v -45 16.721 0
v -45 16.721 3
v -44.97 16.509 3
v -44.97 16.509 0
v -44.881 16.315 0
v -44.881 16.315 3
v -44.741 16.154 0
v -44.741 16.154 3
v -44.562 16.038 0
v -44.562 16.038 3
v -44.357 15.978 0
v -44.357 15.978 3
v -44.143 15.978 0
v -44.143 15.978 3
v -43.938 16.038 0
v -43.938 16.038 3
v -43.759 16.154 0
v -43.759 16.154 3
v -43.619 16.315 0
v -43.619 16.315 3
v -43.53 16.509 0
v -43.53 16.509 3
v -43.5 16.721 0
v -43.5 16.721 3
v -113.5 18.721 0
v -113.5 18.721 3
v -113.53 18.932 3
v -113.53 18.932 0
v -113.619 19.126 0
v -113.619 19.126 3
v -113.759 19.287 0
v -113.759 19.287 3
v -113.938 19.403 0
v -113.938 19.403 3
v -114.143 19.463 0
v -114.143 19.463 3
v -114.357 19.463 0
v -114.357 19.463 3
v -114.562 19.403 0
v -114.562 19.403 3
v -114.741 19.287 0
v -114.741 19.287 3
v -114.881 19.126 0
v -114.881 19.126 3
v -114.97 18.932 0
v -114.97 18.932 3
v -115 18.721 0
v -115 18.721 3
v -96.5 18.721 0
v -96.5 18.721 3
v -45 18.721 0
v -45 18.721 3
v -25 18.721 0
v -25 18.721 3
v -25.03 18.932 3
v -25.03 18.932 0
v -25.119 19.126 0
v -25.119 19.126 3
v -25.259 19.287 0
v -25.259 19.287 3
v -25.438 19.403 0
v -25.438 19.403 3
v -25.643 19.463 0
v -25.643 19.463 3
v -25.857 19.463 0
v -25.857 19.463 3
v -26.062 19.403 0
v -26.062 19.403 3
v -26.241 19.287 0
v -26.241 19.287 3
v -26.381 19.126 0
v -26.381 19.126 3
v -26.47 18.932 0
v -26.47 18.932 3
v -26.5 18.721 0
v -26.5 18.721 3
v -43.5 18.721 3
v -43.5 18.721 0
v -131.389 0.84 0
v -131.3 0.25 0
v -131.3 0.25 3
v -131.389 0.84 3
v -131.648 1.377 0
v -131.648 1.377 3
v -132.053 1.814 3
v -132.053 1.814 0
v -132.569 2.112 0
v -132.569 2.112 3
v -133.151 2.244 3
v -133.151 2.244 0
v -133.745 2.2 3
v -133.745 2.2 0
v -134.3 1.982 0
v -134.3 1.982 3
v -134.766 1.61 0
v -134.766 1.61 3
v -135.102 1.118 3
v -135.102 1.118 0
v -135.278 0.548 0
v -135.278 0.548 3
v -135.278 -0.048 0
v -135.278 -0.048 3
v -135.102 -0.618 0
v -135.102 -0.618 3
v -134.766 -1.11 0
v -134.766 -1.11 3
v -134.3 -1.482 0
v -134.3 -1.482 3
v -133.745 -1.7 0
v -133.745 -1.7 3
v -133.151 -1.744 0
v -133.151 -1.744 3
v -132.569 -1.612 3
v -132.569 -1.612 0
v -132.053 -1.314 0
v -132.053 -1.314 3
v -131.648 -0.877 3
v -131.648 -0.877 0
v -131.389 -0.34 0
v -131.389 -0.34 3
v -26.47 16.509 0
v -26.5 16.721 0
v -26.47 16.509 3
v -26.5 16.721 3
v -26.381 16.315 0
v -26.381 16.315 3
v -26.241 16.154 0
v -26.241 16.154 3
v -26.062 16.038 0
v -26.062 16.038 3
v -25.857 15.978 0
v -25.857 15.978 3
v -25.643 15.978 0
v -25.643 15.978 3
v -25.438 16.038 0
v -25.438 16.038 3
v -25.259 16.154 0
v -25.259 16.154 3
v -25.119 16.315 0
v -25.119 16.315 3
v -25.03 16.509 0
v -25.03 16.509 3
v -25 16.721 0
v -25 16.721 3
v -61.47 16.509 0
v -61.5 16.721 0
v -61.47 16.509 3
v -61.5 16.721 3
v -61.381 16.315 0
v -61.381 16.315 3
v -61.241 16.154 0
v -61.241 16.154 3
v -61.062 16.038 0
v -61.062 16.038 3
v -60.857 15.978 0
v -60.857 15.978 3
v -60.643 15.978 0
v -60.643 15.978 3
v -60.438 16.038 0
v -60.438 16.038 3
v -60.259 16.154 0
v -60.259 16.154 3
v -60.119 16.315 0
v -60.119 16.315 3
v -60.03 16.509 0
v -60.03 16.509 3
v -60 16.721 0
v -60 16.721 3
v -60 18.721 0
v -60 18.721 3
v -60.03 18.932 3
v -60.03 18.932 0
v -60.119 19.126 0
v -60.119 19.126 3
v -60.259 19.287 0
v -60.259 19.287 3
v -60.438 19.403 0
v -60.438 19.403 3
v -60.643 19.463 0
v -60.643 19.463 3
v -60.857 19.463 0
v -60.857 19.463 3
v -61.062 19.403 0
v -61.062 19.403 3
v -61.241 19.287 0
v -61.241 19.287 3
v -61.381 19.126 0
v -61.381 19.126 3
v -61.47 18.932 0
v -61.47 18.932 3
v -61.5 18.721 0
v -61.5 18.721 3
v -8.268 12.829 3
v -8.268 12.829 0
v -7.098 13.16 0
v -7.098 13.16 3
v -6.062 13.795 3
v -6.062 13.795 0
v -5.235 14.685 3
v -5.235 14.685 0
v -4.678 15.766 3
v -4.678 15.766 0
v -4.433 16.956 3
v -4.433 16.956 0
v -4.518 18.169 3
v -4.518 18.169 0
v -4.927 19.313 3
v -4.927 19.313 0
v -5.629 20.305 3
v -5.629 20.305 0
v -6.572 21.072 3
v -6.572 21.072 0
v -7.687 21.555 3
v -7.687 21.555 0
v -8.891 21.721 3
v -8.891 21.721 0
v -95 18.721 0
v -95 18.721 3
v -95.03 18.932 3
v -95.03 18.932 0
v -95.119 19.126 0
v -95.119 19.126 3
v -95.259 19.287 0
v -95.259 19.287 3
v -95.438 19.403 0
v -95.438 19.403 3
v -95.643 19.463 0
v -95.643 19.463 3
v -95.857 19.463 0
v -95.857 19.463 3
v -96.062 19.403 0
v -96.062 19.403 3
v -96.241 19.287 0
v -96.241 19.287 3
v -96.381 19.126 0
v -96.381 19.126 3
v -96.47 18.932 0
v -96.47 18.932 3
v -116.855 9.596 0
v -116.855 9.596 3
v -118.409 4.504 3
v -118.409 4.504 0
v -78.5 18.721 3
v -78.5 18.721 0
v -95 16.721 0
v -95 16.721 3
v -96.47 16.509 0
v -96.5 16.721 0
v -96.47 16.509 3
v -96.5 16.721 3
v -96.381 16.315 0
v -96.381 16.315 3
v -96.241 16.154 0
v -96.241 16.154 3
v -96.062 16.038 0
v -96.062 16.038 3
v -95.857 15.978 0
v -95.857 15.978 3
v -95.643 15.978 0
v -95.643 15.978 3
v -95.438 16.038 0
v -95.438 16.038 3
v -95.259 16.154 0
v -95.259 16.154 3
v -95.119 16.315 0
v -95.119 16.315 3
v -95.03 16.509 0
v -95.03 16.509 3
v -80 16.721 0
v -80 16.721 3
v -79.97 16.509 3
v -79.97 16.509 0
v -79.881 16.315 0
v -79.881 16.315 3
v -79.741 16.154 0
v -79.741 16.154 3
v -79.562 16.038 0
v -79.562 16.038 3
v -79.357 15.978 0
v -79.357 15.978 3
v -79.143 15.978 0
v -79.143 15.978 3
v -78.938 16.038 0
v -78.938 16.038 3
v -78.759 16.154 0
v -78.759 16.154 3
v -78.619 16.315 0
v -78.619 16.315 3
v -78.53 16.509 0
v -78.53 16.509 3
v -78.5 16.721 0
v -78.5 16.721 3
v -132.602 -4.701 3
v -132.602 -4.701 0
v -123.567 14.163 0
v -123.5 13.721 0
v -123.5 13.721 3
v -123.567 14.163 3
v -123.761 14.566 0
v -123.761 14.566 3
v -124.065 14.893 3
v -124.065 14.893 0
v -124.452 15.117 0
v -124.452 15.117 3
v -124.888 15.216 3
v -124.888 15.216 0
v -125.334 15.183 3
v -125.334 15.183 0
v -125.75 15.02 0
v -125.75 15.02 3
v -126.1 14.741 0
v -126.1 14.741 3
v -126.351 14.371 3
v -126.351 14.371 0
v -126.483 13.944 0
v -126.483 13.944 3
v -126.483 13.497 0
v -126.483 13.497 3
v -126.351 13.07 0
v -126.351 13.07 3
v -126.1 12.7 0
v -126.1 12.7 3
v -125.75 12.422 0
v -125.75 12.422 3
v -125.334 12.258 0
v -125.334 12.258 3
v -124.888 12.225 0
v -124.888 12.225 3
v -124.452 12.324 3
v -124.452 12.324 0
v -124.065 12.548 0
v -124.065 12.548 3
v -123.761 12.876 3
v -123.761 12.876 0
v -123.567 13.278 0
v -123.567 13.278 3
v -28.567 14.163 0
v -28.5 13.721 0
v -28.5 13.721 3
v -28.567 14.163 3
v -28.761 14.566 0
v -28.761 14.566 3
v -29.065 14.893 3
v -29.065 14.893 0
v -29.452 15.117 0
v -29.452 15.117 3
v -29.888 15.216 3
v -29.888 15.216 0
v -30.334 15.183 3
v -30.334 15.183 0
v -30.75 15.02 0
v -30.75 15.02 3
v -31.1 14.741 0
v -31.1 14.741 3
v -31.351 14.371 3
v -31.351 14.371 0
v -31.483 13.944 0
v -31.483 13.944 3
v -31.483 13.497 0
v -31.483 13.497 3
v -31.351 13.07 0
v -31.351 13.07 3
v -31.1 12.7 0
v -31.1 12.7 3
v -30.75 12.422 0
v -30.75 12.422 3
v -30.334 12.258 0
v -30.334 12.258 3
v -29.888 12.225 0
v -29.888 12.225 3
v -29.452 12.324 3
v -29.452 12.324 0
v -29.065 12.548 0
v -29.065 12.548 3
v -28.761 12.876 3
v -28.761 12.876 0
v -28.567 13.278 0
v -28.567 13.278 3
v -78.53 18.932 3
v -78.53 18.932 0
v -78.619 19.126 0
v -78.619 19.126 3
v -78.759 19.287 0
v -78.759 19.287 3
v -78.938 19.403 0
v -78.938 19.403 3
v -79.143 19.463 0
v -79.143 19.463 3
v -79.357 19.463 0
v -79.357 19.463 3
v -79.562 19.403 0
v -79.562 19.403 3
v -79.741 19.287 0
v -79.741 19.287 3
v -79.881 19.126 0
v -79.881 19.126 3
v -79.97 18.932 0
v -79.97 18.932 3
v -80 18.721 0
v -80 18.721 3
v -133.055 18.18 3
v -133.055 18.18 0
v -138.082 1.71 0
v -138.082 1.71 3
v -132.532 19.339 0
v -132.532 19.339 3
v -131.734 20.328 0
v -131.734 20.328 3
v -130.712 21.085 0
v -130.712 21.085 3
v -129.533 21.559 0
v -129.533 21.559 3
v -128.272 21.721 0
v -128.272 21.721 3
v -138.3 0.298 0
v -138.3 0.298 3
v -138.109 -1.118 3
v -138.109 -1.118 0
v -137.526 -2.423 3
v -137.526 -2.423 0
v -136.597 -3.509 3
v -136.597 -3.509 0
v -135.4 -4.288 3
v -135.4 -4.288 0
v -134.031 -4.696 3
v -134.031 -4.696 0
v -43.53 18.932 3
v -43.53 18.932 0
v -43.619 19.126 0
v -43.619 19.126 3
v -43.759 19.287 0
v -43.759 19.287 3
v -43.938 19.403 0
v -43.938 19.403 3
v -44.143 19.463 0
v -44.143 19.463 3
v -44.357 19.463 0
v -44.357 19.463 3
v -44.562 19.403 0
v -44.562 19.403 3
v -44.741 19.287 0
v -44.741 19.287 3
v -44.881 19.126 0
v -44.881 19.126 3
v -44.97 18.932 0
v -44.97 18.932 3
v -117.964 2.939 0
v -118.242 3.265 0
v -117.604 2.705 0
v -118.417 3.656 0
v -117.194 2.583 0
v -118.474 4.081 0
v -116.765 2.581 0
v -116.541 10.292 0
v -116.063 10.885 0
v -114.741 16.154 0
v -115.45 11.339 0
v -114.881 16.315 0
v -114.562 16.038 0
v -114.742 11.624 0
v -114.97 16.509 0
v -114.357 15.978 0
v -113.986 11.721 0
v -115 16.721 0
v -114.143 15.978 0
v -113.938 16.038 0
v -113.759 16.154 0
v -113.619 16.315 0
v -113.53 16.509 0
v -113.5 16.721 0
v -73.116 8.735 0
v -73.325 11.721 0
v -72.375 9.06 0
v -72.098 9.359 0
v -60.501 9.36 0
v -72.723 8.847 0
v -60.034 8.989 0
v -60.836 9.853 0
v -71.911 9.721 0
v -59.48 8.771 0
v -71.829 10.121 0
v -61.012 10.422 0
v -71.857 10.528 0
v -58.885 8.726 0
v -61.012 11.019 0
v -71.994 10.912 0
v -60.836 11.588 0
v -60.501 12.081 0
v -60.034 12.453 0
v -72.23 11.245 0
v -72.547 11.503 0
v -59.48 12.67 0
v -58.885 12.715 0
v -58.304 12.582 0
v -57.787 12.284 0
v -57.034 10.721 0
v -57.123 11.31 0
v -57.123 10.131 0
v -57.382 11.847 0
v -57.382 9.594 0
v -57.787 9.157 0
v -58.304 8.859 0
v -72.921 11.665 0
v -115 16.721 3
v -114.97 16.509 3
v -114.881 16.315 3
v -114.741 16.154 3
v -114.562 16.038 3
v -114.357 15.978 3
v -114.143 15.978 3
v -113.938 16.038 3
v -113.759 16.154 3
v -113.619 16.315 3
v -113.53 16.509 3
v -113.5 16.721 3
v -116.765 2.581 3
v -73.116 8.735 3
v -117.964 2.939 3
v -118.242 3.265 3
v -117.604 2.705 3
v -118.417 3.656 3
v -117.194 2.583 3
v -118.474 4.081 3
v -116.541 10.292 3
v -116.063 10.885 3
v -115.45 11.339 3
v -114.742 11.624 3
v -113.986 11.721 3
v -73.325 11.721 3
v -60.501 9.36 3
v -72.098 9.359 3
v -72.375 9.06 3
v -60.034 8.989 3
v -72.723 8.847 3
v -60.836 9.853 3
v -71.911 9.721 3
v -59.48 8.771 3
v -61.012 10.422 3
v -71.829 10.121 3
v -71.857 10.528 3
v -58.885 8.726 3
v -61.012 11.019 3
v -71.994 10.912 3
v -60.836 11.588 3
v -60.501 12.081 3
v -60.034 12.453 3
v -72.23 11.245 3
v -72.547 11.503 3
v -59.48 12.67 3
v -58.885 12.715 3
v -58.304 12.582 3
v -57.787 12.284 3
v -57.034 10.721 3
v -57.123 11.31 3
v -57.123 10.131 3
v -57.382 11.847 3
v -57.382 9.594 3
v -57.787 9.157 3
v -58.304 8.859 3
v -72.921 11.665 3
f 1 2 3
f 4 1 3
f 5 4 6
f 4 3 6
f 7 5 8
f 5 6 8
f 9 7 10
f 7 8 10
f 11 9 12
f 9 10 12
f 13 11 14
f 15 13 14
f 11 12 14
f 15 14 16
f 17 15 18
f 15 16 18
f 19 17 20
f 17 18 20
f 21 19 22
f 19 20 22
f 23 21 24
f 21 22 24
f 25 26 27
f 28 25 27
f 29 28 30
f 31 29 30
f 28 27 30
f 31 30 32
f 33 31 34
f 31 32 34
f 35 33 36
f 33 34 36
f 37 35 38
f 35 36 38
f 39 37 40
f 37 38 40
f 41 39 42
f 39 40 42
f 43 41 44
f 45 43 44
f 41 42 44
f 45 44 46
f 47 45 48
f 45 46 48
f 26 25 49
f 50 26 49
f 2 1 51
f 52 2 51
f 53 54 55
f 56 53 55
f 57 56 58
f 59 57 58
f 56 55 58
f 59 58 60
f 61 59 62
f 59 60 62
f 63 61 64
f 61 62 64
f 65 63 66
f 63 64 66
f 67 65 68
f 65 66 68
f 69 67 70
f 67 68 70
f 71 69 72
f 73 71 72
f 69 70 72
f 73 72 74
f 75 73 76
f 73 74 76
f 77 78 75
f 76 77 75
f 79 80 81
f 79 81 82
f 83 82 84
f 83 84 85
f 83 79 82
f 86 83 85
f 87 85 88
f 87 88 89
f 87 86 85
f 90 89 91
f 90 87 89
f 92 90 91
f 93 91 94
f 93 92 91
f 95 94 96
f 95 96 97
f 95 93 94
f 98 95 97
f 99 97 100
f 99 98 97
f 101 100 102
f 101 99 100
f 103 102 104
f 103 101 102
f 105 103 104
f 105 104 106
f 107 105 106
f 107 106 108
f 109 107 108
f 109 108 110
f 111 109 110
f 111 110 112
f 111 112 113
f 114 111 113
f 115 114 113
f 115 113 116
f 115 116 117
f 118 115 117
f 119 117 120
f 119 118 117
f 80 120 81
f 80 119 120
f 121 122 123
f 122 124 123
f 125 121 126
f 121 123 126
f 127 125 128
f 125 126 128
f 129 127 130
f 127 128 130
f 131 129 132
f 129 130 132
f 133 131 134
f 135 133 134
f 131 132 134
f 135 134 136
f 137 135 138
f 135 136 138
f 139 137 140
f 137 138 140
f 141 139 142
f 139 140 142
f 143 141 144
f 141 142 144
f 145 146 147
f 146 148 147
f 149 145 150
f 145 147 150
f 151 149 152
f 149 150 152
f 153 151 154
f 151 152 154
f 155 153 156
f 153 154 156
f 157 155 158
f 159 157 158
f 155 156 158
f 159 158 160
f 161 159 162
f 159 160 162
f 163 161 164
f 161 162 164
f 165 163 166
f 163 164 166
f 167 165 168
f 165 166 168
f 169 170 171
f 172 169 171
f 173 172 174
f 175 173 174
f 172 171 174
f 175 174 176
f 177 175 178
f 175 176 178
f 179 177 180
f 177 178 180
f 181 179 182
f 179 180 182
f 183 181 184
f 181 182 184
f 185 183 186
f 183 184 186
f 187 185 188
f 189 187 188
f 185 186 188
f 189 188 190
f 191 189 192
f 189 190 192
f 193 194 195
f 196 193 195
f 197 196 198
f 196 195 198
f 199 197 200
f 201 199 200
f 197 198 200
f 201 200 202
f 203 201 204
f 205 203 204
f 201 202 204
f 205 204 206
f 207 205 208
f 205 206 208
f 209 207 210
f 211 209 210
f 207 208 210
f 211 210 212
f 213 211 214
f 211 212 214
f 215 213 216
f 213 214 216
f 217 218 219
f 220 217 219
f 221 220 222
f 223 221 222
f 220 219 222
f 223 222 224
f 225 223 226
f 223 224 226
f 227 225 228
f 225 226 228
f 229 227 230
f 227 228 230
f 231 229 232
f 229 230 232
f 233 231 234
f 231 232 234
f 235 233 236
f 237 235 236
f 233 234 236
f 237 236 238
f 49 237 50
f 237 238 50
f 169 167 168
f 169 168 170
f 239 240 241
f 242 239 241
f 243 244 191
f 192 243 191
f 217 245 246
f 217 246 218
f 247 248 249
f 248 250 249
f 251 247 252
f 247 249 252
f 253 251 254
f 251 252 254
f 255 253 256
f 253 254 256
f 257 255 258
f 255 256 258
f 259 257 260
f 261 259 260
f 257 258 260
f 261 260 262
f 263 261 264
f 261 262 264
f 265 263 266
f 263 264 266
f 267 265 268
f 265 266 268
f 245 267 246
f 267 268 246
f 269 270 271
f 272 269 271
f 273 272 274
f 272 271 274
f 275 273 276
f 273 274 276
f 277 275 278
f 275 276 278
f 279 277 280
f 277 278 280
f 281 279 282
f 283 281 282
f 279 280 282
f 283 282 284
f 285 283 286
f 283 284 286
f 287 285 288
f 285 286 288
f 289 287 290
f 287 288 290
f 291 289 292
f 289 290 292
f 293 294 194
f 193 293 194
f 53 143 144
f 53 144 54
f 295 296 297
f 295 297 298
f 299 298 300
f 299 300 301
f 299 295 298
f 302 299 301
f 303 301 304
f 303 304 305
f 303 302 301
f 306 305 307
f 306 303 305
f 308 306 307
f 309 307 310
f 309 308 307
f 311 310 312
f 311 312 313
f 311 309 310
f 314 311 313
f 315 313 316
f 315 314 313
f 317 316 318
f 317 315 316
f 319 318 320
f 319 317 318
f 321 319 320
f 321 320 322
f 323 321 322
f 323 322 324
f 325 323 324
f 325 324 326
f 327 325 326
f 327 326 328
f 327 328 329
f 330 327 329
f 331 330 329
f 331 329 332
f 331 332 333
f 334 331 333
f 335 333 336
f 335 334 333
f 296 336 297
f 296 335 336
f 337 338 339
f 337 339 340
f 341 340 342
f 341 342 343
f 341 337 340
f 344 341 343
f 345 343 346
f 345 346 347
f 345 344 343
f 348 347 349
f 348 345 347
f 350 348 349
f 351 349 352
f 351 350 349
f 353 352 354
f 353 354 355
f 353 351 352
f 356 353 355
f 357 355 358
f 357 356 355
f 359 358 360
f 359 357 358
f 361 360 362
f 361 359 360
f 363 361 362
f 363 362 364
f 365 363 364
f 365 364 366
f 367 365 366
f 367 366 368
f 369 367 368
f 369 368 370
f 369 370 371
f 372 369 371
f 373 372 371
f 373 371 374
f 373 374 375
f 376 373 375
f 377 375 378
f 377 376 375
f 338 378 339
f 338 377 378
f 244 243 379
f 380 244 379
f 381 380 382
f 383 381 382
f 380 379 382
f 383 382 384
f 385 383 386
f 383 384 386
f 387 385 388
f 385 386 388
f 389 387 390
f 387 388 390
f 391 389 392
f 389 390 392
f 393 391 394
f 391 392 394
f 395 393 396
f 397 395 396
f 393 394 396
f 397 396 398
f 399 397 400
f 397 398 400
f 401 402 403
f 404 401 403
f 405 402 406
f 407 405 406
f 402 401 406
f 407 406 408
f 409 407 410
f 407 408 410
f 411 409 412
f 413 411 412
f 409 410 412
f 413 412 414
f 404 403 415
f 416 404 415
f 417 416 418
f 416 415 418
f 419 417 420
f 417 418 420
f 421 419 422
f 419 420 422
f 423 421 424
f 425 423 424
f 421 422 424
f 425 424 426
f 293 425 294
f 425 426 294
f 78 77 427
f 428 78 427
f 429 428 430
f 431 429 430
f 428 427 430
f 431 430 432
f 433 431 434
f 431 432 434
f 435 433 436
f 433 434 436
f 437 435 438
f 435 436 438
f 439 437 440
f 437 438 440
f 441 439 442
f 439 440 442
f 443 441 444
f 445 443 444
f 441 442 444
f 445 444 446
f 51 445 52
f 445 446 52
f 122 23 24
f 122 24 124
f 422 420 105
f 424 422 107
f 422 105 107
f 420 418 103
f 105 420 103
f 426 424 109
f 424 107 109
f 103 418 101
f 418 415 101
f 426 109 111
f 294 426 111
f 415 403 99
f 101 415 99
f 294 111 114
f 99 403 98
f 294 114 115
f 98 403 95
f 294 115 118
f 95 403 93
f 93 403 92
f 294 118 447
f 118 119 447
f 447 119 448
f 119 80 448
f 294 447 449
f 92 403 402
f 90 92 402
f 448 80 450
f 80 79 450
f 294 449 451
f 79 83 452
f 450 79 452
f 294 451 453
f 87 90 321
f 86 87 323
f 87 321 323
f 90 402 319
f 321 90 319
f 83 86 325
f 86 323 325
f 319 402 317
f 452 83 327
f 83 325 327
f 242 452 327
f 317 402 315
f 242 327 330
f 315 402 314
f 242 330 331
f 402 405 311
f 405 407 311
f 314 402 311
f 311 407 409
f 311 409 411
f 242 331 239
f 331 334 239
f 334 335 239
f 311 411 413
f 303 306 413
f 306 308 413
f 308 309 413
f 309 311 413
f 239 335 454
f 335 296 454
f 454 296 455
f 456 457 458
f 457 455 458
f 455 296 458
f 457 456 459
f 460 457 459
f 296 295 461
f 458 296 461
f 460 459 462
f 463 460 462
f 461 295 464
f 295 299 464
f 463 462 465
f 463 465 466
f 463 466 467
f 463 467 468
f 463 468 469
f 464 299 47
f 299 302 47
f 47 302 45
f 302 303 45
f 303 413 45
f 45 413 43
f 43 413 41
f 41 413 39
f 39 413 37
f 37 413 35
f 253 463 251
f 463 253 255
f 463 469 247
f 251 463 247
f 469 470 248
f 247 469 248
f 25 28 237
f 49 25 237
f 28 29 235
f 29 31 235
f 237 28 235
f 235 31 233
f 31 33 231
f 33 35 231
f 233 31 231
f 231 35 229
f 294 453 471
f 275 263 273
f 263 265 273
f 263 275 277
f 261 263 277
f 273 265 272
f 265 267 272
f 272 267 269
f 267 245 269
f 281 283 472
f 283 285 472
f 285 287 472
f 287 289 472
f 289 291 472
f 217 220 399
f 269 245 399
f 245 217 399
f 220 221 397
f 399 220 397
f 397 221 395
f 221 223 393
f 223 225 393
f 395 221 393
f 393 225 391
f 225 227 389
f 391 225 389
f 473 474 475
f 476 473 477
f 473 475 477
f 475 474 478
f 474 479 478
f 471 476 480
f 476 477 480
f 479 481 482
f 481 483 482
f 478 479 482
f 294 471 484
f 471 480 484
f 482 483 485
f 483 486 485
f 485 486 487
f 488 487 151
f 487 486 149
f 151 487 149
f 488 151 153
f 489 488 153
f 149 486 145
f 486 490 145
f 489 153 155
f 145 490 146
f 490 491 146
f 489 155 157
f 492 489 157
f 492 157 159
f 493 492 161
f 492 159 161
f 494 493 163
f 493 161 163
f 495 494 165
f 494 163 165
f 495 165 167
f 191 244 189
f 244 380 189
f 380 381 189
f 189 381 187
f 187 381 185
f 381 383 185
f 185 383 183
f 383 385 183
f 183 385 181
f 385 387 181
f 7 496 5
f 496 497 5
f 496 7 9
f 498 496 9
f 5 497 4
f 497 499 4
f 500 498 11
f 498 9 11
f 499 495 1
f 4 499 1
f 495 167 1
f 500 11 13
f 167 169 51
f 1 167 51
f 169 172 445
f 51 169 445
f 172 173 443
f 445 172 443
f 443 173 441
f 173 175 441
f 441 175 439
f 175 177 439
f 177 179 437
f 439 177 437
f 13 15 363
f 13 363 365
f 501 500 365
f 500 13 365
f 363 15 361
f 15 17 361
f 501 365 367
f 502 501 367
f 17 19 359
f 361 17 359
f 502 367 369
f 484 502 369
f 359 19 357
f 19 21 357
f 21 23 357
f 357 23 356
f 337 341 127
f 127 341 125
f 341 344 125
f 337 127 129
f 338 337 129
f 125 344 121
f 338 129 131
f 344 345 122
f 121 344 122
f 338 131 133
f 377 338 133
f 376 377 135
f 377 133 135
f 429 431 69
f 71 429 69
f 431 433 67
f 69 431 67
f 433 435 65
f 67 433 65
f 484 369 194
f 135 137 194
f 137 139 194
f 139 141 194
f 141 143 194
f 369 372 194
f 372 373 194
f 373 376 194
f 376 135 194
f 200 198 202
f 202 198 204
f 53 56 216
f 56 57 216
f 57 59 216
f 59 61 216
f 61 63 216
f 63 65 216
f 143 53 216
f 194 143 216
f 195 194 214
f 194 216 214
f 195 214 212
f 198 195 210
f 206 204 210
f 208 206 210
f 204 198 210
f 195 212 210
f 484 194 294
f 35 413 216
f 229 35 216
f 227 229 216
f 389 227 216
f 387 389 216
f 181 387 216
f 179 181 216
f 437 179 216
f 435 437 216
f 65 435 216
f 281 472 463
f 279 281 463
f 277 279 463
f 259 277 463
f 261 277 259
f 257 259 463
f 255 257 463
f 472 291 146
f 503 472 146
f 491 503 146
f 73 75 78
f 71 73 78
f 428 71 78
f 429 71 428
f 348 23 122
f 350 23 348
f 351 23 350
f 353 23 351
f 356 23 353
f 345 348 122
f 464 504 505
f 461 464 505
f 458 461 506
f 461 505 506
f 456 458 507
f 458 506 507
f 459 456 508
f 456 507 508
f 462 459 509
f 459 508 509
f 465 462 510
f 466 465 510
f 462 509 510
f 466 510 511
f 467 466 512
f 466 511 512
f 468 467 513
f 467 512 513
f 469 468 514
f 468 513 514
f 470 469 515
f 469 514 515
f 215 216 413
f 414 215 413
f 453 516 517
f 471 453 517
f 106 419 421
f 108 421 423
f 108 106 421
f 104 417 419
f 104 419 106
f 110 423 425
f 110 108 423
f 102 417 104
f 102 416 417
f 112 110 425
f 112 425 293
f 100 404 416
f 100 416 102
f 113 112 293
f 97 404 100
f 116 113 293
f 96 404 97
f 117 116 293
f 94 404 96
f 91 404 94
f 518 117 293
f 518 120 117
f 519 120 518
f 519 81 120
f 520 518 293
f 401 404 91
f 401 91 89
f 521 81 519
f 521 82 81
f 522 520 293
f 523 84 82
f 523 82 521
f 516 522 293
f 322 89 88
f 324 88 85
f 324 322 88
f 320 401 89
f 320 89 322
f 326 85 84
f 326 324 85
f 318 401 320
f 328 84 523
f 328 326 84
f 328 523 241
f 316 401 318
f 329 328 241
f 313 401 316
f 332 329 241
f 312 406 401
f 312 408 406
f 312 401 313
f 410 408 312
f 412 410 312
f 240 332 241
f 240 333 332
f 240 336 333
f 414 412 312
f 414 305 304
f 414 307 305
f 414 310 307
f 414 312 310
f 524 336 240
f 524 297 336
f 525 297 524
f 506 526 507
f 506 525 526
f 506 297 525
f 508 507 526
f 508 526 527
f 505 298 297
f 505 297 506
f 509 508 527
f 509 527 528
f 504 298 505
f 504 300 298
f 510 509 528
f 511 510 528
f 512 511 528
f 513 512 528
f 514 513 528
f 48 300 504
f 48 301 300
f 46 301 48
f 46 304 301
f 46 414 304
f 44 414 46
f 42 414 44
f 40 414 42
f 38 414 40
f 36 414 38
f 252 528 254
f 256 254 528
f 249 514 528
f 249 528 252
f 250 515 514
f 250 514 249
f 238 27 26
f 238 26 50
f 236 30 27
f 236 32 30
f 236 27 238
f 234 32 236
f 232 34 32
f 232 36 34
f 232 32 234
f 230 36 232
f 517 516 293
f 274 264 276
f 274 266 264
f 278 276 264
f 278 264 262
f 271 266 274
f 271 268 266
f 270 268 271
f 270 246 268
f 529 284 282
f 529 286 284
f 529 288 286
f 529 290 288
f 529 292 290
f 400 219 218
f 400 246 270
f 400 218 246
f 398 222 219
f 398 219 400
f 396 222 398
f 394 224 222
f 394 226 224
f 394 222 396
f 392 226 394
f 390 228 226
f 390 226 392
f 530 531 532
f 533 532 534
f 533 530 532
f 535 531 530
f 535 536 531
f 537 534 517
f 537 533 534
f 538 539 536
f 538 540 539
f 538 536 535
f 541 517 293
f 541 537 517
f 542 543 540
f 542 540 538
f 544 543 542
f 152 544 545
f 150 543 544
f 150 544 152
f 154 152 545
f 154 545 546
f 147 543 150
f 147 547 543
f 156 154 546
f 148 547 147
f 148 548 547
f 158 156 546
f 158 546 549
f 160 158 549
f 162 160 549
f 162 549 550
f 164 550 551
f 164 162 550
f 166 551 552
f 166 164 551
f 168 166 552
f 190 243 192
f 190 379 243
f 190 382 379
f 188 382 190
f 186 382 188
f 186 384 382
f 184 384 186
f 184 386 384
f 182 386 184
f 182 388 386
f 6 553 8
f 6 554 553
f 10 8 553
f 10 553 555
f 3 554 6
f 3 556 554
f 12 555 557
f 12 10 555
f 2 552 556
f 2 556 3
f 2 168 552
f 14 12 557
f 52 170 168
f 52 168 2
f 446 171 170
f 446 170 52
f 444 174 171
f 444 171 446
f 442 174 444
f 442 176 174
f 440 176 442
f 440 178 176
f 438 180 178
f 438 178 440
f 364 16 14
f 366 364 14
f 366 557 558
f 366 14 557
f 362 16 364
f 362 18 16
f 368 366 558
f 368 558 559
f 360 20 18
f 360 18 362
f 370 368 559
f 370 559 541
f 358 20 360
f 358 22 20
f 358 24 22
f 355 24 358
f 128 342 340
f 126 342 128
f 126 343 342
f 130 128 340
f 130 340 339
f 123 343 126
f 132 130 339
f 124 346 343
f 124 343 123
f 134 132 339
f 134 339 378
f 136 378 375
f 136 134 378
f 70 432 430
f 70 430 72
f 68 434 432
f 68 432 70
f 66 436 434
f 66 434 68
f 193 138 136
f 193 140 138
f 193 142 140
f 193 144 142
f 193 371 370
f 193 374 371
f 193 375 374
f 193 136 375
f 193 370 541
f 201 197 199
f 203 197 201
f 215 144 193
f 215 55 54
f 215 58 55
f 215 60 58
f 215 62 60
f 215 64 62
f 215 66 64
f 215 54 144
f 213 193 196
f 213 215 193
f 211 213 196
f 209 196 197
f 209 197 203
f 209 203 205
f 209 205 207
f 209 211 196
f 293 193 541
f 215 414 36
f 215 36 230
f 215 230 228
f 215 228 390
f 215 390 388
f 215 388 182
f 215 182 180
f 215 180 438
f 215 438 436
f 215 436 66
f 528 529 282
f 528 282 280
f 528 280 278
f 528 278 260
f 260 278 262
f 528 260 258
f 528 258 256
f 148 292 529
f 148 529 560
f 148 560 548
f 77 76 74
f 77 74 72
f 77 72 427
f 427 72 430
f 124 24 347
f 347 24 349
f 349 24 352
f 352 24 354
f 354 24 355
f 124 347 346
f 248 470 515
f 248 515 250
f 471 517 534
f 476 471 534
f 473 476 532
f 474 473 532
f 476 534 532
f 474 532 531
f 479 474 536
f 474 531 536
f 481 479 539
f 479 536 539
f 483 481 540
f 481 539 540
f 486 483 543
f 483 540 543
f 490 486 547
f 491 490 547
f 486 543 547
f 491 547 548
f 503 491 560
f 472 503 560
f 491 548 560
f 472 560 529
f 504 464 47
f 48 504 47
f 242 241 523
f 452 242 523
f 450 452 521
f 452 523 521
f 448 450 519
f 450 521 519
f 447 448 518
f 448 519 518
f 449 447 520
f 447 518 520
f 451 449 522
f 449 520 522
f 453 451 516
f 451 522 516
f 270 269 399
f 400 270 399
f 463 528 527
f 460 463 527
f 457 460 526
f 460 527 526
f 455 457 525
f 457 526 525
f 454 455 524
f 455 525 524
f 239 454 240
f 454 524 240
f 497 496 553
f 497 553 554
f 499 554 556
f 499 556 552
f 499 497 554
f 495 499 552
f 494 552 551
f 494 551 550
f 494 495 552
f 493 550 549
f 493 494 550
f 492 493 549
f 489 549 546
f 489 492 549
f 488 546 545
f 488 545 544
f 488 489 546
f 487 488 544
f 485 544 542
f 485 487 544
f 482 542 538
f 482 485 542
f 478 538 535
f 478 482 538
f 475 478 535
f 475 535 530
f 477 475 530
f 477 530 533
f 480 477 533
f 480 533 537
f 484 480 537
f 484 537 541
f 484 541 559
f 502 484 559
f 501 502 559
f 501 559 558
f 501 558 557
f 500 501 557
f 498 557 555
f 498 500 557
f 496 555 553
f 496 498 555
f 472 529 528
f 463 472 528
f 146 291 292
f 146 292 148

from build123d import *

# Parameters (mm, degrees)
SKETCH_2_R          = 2
SKETCH_2_R_2        = 1.5
SKETCH_2_W          = 20
SKETCH_2_H          = 2
EXTRUDE_1_DEPTH     = 3
SKETCH_3_R          = 0.75
CUT_EXTRUDE_1_DEPTH = 141.027398671
FILLET_1_R          = 5


with BuildPart() as part:
    # 草图2 → 凸台-拉伸1 (new body)
    with BuildSketch(Plane.XY):
        with BuildLine():
            Line((-132.601963201, -4.701034703), (-8.26765697, 12.828618462))
            ThreePointArc((-8.26765697, 12.828618462), (-4.434509027, 17.565346586), (-8.891400832, 21.720551987))
            Line((-8.891400832, 21.720551987), (-131.973846298, 21.720551987))
            Line((-131.973846298, 21.720551987), (-138.082164404, 1.709761493))
            ThreePointArc((-138.082164404, 1.709761493), (-137.100605417, -2.998907272), (-132.601963201, -4.701034703))
        make_face()
        with Locations((-59.03447946, 10.720551987)):
            Circle(SKETCH_2_R, mode=Mode.SUBTRACT)
        with Locations((-133.3, 0.25)):
            Circle(SKETCH_2_R, mode=Mode.SUBTRACT)
        with Locations((-125, 13.720551987)):
            Circle(SKETCH_2_R_2, mode=Mode.SUBTRACT)
        with Locations((-30, 13.720551987)):
            Circle(SKETCH_2_R_2, mode=Mode.SUBTRACT)
        with Locations((-70, 17.720551987)):
            Rectangle(SKETCH_2_W, SKETCH_2_H, mode=Mode.SUBTRACT)
        with Locations((-105, 17.720551987)):
            Rectangle(SKETCH_2_W, SKETCH_2_H, mode=Mode.SUBTRACT)
        with Locations((-35, 17.720551987)):
            Rectangle(SKETCH_2_W, SKETCH_2_H, mode=Mode.SUBTRACT)
    extrude(amount=EXTRUDE_1_DEPTH)

    # 草图3 → 切除-拉伸1 (cut, through all)
    with BuildSketch(Plane.XY.offset(3)):
        with Locations((-114.25, 18.720551987)):
            Circle(SKETCH_3_R)
        with Locations((-114.25, 16.720551987)):
            Circle(SKETCH_3_R)
        with Locations((-95.75, 18.720551987)):
            Circle(SKETCH_3_R)
        with Locations((-95.75, 16.720551987)):
            Circle(SKETCH_3_R)
        with Locations((-79.25, 18.720551987)):
            Circle(SKETCH_3_R)
        with Locations((-79.25, 16.720551987)):
            Circle(SKETCH_3_R)
        with Locations((-60.75, 18.720551987)):
            Circle(SKETCH_3_R)
        with Locations((-60.75, 16.720551987)):
            Circle(SKETCH_3_R)
        with Locations((-44.25, 18.720551987)):
            Circle(SKETCH_3_R)
        with Locations((-44.25, 16.720551987)):
            Circle(SKETCH_3_R)
        with Locations((-25.75, 18.720551987)):
            Circle(SKETCH_3_R)
        with Locations((-25.75, 16.720551987)):
            Circle(SKETCH_3_R)
        with BuildLine():
            Line((-116.854825567, 9.596408883), (-118.409147877, 4.504464164))
            ThreePointArc((-118.409147877, 4.504464164), (-118.114680182, 3.091863534), (-116.765087517, 2.581225305))
            Line((-116.765087517, 2.581225305), (-73.115887133, 8.735241576))
            ThreePointArc((-73.115887133, 8.735241576), (-71.828975077, 10.325514799), (-73.325298173, 11.720551987))
            Line((-73.325298173, 11.720551987), (-113.985526924, 11.720551987))
            ThreePointArc((-113.985526924, 11.720551987), (-115.770524027, 11.13173123), (-116.854825567, 9.596408883))
        make_face()
    extrude(amount=-CUT_EXTRUDE_1_DEPTH, mode=Mode.SUBTRACT)

    # 圆角1
    fillet_1_edges = [part.edges().sort_by_distance(p)[0] for p in [
        (-131.973846298, 21.720551987, 1.5),
    ]]
    fillet(fillet_1_edges, radius=FILLET_1_R)


solid = part.part
